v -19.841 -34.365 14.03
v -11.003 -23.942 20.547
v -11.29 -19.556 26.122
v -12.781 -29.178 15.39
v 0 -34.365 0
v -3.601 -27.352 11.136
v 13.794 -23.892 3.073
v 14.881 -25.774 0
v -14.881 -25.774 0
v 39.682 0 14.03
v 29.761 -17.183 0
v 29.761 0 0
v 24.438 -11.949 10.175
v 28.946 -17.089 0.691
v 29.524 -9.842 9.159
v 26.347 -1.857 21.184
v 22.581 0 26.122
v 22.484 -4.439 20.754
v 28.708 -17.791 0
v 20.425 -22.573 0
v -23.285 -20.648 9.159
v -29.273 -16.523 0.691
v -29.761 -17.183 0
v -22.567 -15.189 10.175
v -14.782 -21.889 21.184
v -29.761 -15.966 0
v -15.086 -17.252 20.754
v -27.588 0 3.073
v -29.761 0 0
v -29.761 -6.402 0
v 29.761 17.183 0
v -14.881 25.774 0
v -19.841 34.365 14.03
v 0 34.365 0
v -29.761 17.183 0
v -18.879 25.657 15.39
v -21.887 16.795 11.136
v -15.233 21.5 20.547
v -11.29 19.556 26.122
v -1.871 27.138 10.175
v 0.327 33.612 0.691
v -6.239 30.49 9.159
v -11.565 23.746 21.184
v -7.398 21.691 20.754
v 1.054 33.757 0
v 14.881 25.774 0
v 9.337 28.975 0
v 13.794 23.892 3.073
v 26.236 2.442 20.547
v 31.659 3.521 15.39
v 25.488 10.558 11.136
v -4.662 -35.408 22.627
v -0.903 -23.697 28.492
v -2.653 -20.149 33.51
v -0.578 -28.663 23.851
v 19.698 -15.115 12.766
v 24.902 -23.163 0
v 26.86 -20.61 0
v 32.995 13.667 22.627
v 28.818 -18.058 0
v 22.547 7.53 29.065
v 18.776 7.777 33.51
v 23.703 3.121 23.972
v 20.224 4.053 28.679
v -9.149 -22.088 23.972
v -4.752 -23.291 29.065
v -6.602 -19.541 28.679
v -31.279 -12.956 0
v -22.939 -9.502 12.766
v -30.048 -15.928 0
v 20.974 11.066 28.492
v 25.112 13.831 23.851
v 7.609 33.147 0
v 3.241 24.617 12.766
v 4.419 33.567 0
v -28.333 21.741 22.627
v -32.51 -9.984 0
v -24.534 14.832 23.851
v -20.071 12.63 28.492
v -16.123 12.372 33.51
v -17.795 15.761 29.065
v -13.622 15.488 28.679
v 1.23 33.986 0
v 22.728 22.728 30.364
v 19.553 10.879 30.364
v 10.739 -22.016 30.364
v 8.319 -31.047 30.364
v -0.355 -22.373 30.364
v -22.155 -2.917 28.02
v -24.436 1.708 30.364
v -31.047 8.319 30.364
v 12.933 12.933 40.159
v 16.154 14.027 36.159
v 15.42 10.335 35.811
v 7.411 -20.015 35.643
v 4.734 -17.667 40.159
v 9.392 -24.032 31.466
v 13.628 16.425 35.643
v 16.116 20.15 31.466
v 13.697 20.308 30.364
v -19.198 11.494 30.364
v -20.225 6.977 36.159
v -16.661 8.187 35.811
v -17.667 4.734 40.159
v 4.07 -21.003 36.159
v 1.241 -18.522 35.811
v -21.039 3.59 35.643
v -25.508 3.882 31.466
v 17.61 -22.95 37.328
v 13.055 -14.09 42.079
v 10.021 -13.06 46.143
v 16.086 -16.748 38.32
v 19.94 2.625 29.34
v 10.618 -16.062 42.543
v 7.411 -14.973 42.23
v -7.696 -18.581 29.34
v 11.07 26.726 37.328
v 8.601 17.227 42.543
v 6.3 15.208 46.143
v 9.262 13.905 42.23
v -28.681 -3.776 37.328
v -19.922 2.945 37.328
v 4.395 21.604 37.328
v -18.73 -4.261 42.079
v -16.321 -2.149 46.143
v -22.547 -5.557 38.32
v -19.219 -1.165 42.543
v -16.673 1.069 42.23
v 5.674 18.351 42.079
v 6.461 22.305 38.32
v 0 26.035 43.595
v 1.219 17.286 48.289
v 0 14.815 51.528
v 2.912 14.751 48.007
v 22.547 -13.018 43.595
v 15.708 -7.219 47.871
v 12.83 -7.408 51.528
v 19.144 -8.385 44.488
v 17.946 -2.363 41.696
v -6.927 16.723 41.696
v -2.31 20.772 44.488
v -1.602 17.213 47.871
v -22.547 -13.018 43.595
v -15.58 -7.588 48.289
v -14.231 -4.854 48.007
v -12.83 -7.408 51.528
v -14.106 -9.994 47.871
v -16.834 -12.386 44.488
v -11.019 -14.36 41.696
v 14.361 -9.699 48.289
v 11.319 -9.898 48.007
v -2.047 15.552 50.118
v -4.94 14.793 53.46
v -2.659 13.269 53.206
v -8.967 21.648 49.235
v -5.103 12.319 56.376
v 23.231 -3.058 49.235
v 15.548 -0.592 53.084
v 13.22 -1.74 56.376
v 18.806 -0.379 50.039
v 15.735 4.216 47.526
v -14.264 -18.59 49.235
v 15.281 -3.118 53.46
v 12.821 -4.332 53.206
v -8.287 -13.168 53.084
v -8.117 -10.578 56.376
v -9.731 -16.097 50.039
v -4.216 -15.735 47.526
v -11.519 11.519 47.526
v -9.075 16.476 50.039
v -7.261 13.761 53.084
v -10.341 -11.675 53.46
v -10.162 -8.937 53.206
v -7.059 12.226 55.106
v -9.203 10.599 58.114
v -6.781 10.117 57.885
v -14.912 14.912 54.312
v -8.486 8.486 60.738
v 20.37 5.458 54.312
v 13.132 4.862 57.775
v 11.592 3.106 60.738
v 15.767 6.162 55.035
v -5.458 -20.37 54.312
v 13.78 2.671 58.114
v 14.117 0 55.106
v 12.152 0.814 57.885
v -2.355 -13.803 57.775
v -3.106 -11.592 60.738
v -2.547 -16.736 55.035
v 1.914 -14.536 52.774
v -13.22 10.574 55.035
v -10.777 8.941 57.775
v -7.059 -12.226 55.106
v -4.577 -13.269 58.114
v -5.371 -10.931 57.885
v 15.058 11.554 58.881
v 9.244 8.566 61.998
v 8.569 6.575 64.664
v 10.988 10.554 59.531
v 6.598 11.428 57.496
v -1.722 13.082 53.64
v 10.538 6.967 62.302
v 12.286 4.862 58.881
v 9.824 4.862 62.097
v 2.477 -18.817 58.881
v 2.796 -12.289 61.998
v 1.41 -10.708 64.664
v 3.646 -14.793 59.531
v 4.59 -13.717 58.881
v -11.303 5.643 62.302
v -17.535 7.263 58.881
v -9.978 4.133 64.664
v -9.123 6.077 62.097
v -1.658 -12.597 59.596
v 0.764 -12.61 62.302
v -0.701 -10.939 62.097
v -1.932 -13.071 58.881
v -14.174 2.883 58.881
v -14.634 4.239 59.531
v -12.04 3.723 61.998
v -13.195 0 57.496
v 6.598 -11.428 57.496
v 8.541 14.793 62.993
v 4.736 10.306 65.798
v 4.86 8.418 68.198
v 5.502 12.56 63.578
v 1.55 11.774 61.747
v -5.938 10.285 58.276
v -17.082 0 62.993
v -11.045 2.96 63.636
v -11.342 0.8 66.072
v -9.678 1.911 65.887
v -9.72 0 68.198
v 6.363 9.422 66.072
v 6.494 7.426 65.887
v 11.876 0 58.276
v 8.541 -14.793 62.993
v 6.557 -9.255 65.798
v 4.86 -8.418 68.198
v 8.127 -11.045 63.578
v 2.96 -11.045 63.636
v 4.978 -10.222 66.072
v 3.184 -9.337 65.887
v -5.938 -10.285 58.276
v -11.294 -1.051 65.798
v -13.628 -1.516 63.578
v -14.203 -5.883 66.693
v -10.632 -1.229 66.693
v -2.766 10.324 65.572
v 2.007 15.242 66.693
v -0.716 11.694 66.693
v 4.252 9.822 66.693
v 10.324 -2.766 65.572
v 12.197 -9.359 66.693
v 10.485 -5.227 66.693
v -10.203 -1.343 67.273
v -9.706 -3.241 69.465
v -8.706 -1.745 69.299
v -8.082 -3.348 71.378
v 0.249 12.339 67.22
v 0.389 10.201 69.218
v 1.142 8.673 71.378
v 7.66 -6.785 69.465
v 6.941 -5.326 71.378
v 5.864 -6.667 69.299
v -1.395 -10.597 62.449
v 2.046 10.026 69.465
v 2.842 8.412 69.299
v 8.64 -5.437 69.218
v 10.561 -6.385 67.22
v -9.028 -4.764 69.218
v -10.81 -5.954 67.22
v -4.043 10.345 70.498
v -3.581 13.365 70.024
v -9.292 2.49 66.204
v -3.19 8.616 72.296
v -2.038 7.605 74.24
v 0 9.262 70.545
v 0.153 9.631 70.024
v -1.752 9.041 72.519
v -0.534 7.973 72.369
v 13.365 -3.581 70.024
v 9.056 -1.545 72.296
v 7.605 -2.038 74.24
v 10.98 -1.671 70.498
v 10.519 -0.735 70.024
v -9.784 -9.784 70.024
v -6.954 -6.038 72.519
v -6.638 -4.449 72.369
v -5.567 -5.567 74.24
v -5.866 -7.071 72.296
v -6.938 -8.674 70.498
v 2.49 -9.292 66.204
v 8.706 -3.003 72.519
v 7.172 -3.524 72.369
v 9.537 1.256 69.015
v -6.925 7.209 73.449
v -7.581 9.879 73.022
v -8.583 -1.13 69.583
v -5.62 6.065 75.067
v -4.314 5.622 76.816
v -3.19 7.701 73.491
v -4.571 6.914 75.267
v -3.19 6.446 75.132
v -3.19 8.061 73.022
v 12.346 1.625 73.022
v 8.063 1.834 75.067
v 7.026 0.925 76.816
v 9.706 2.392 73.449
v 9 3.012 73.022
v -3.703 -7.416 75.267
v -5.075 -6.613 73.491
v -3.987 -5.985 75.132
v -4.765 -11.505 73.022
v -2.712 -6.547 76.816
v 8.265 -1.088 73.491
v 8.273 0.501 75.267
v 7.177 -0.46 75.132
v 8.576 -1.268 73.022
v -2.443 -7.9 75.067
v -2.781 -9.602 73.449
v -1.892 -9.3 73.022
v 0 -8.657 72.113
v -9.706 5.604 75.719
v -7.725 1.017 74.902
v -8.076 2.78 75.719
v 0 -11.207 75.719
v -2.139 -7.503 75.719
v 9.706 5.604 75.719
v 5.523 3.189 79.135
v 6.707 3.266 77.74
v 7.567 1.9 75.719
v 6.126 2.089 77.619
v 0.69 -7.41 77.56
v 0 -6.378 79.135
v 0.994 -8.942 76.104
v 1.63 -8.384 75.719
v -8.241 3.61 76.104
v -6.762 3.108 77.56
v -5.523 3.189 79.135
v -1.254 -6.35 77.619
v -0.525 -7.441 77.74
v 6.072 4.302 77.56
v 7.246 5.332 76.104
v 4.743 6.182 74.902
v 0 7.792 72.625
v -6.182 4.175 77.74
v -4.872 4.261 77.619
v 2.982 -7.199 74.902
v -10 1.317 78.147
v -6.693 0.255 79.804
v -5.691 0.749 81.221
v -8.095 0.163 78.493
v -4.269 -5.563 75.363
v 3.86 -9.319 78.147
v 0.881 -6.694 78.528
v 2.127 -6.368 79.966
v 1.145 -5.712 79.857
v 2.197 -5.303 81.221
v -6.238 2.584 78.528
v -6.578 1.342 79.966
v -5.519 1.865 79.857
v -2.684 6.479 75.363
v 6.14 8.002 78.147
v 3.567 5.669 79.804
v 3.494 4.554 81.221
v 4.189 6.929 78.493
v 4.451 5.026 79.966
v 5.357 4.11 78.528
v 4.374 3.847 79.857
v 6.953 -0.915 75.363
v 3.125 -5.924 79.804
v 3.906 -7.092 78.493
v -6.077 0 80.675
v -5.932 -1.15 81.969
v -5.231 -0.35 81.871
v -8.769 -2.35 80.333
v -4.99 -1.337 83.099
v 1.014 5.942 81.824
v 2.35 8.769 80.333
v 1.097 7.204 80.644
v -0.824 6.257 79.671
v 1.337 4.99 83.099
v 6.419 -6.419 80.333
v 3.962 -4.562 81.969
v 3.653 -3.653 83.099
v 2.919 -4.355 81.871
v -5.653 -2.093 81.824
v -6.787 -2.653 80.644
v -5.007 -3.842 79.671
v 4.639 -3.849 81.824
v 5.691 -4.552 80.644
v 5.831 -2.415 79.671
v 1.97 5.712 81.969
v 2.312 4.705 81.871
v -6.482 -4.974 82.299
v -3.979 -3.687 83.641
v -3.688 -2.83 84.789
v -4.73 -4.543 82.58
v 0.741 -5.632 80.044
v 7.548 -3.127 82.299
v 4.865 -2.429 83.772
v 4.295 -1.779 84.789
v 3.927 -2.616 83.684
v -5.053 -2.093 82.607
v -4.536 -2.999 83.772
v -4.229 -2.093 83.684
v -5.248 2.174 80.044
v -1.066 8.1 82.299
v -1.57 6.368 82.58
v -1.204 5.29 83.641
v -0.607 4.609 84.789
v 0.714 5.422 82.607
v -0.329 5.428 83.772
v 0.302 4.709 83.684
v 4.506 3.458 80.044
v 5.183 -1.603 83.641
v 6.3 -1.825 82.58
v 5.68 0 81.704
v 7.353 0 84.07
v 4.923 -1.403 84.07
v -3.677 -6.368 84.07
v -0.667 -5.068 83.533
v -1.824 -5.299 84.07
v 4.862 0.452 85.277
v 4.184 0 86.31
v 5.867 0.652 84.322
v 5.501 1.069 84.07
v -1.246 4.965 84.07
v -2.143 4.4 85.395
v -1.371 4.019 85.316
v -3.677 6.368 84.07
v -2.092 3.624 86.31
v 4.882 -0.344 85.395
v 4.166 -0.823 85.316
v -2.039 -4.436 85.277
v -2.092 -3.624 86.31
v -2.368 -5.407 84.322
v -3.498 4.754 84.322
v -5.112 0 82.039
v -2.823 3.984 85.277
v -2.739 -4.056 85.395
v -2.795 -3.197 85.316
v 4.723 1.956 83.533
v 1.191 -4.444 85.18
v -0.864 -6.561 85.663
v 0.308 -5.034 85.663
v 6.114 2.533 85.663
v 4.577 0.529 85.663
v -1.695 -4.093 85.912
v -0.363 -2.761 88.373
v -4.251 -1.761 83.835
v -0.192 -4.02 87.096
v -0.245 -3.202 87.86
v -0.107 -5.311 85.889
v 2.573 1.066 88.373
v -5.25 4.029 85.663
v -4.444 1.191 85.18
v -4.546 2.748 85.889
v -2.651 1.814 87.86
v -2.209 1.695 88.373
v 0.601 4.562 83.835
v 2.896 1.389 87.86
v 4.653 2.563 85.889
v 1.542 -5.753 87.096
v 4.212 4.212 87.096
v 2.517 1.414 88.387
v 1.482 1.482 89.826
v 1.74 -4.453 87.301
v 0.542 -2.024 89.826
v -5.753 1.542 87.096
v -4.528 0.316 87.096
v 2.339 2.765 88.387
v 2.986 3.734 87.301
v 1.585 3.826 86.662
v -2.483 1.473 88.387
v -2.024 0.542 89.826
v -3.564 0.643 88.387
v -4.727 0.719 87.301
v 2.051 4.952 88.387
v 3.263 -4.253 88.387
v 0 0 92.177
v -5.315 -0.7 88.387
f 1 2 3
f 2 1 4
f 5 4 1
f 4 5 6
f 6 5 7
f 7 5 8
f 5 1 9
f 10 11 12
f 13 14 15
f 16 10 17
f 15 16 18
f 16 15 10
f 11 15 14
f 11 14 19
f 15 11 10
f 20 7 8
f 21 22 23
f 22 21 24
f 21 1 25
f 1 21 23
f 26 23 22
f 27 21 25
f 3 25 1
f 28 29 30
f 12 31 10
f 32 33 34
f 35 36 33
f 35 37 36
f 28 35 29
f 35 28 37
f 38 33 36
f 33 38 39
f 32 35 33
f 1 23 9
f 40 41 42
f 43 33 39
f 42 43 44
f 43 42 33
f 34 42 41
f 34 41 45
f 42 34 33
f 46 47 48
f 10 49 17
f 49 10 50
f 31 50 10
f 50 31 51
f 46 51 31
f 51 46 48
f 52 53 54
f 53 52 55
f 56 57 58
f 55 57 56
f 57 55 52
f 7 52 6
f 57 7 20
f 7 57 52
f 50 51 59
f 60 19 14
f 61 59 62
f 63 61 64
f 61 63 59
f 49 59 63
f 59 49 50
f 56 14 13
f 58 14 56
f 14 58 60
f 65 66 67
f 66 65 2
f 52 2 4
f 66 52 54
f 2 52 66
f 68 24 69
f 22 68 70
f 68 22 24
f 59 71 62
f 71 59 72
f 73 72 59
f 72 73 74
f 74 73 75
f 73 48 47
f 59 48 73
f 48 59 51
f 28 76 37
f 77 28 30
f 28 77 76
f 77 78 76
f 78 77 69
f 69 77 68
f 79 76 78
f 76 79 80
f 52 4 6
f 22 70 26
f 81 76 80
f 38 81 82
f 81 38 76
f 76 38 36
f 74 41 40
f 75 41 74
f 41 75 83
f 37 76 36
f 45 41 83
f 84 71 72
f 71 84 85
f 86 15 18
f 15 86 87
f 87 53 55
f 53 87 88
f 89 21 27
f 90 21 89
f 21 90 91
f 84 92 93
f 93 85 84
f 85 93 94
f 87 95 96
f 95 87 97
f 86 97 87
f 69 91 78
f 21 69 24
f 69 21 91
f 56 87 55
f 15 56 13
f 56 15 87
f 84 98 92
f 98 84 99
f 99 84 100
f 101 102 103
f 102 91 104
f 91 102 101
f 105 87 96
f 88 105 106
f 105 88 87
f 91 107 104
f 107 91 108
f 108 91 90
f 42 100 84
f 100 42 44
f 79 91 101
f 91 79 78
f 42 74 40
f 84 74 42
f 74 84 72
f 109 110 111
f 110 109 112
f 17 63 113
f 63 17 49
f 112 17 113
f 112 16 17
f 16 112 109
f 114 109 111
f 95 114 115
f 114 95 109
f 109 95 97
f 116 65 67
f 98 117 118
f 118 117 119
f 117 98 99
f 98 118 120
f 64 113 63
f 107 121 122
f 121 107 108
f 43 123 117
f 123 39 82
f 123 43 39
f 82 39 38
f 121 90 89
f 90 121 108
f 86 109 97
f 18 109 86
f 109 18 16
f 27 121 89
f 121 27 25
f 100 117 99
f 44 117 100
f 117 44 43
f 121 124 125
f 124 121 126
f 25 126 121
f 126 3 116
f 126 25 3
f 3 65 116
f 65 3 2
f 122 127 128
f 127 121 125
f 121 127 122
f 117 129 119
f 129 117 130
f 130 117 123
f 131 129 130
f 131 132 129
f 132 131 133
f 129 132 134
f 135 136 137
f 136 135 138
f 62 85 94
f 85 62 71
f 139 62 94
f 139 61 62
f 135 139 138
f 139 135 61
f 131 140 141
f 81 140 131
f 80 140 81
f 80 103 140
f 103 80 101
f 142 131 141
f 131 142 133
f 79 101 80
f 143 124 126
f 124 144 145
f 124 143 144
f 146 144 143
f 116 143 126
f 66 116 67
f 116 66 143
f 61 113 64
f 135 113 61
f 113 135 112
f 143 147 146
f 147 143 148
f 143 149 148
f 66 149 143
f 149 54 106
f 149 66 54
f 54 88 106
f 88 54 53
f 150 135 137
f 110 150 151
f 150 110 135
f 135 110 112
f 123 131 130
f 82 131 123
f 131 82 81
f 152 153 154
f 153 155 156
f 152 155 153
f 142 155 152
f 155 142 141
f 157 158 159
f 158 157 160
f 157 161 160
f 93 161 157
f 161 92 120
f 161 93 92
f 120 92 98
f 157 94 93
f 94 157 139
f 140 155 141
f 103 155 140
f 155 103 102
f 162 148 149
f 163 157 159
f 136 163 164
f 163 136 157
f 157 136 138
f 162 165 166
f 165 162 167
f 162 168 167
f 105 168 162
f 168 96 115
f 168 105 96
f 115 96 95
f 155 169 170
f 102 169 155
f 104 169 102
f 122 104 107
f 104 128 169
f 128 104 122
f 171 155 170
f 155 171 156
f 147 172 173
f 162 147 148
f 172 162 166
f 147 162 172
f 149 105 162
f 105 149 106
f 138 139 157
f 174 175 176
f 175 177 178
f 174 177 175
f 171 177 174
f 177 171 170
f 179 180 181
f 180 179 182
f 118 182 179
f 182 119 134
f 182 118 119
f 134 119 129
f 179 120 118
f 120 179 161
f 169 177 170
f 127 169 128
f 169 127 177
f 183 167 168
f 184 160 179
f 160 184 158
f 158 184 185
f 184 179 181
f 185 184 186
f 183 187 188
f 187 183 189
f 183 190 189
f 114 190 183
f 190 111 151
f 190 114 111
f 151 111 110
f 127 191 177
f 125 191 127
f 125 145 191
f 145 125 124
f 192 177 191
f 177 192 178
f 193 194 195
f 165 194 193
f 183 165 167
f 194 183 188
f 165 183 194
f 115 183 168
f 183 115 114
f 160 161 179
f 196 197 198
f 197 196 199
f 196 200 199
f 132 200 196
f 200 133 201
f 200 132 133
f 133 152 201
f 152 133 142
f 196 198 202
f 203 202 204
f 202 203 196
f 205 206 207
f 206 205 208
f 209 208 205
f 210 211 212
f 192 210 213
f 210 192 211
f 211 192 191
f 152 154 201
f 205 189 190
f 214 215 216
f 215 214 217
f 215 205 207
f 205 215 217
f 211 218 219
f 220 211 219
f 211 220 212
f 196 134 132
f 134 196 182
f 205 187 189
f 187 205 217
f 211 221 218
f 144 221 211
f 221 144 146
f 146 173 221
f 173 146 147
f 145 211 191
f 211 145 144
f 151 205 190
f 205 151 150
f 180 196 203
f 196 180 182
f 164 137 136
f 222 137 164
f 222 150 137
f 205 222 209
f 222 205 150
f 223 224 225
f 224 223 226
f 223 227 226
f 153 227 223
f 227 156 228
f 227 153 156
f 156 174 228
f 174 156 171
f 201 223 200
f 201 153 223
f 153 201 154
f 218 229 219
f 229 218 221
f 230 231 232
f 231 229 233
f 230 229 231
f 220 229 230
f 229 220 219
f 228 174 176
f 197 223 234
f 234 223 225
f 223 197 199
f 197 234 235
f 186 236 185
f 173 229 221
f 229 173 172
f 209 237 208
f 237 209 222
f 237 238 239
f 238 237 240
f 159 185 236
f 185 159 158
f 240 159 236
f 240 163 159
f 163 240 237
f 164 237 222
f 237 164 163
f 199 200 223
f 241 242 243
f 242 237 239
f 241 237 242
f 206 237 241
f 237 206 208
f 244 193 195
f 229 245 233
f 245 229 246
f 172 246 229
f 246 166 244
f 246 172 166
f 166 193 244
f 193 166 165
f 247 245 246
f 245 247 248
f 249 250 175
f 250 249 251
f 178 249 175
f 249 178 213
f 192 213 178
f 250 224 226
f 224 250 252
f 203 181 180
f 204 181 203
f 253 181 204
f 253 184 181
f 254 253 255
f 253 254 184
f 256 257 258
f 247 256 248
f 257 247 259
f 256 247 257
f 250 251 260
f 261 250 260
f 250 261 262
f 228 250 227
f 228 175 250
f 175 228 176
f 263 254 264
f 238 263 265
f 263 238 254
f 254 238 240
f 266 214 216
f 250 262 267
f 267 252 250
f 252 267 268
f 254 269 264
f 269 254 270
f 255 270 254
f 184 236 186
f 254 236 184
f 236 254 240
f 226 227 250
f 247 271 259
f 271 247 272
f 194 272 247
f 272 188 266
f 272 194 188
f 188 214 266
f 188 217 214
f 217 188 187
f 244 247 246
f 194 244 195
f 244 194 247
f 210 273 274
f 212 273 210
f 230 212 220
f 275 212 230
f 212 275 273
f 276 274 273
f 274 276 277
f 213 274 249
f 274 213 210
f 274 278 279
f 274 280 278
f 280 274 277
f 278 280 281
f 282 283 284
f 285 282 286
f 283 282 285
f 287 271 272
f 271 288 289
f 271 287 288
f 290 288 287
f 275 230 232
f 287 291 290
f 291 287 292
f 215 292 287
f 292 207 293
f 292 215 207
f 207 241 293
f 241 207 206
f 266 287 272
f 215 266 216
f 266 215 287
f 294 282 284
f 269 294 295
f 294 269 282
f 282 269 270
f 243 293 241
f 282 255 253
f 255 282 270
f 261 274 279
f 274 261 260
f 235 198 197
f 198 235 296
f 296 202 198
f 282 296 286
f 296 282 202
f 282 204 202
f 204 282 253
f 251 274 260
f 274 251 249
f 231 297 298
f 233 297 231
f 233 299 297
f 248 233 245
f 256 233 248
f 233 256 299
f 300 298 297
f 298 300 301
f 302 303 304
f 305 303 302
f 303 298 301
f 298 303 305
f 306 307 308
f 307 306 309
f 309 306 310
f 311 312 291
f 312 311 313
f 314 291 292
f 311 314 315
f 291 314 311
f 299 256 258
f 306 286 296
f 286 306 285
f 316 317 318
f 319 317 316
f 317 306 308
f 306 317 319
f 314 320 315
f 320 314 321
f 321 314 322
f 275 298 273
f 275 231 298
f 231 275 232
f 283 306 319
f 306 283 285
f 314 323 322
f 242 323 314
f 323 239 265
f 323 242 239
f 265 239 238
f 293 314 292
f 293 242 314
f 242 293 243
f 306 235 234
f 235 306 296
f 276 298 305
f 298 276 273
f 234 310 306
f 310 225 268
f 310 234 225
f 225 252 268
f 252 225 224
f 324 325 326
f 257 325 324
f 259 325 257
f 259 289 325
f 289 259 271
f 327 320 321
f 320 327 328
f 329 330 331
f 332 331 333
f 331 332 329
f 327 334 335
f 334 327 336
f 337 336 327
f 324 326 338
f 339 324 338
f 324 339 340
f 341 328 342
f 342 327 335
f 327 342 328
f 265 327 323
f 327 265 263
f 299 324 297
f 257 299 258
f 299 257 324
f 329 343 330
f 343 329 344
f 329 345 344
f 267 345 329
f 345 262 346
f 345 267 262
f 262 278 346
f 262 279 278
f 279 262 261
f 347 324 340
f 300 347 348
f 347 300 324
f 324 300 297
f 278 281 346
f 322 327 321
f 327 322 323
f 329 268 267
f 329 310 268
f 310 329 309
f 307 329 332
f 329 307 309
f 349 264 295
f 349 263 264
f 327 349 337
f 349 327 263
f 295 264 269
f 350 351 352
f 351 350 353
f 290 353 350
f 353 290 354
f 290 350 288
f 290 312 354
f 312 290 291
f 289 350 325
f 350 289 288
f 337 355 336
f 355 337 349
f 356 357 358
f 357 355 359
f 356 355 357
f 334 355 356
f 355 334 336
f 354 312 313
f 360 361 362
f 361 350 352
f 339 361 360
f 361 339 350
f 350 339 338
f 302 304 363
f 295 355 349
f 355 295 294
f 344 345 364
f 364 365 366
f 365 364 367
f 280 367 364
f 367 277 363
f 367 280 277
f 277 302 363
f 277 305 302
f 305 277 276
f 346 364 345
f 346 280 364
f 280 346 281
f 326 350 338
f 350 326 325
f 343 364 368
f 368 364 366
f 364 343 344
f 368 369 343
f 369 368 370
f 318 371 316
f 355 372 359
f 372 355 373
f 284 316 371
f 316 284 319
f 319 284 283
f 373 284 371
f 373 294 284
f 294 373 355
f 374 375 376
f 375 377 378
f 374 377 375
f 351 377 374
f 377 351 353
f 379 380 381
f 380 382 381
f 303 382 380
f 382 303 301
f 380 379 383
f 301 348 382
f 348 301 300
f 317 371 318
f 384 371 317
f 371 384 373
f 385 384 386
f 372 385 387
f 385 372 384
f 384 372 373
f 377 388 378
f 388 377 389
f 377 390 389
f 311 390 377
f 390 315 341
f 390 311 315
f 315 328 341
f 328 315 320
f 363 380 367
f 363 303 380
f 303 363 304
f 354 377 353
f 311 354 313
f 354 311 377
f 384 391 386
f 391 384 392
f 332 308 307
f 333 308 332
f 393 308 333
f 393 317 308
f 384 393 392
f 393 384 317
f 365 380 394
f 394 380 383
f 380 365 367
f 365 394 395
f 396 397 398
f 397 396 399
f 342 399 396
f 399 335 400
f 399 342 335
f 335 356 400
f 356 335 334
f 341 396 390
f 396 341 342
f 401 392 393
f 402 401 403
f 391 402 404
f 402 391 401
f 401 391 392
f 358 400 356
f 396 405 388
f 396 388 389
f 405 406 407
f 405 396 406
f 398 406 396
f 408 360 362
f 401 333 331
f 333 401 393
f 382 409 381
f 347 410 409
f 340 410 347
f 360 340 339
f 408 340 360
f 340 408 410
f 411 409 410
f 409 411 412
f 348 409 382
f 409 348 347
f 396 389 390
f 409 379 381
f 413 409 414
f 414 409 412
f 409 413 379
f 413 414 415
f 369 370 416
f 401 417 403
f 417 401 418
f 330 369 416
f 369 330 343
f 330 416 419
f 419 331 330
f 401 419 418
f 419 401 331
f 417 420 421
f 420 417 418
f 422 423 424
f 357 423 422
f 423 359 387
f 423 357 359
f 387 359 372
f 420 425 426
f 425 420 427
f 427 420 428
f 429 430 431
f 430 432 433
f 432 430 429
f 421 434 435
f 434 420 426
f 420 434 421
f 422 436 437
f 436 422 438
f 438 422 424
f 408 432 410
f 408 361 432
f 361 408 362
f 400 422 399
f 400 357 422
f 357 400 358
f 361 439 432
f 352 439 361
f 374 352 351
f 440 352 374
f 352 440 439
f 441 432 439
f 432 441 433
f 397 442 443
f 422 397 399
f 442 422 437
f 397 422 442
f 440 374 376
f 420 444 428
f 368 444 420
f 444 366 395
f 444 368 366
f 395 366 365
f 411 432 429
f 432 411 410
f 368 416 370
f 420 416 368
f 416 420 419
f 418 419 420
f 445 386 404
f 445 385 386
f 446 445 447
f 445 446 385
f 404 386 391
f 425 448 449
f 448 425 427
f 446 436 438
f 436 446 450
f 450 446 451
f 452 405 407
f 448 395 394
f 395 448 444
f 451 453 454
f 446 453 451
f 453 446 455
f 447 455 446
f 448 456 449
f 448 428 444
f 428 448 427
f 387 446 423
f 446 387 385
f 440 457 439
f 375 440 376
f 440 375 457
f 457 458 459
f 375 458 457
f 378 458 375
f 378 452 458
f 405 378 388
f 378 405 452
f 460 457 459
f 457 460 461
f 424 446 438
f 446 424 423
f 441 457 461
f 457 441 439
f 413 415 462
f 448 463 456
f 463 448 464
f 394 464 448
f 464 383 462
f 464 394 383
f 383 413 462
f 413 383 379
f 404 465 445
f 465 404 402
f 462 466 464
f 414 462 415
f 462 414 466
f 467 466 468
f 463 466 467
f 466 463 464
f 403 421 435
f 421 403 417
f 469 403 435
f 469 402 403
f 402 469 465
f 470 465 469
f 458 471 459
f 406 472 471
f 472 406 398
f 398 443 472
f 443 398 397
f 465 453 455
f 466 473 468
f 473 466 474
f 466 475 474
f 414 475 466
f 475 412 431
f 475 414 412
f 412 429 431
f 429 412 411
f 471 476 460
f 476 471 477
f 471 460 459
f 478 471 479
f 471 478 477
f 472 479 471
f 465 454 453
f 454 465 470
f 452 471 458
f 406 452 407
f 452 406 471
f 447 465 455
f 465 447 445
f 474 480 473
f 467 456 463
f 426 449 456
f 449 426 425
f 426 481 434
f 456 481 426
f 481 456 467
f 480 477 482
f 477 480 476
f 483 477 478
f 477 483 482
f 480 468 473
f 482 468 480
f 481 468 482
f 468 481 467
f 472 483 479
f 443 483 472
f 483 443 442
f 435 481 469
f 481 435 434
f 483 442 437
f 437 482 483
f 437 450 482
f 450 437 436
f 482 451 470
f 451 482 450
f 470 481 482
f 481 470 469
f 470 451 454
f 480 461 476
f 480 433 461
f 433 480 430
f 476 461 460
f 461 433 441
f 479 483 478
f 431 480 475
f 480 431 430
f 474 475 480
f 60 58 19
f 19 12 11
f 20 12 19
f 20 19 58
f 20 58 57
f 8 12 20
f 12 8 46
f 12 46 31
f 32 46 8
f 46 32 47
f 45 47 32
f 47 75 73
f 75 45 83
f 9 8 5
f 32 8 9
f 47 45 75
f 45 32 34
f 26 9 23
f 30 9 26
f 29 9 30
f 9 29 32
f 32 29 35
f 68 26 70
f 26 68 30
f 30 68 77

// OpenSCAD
intersection() {
	union() {
		translate(v = [0, 0, 0.0000000000]) {
			scale(v = 0.6000000000) {
				rotate(a = [0, 0, 0.0000000000]) {
					rotate(a = [45, 35.2643896828, 0]) {
						cube(center = true, size = 81.0000000000);
					}
				}
			}
		}
		translate(v = [0, 0, 10.0000000000]) {
			scale(v = 0.5400000000) {
				rotate(a = [0, 0, 22.5000000000]) {
					rotate(a = [45, 35.2643896828, 0]) {
						cube(center = true, size = 81.0000000000);
					}
				}
			}
		}
		translate(v = [0, 0, 19.0000000000]) {
			scale(v = 0.4860000000) {
				rotate(a = [0, 0, 45.0000000000]) {
					rotate(a = [45, 35.2643896828, 0]) {
						cube(center = true, size = 81.0000000000);
					}
				}
			}
		}
		translate(v = [0, 0, 27.1000000000]) {
			scale(v = 0.4374000000) {
				rotate(a = [0, 0, 67.5000000000]) {
					rotate(a = [45, 35.2643896828, 0]) {
						cube(center = true, size = 81.0000000000);
					}
				}
			}
		}
		translate(v = [0, 0, 34.3900000000]) {
			scale(v = 0.3936600000) {
				rotate(a = [0, 0, 90.0000000000]) {
					rotate(a = [45, 35.2643896828, 0]) {
						cube(center = true, size = 81.0000000000);
					}
				}
			}
		}
		translate(v = [0, 0, 40.9510000000]) {
			scale(v = 0.3542940000) {
				rotate(a = [0, 0, 112.5000000000]) {
					rotate(a = [45, 35.2643896828, 0]) {
						cube(center = true, size = 81.0000000000);
					}
				}
			}
		}
		translate(v = [0, 0, 46.8559000000]) {
			scale(v = 0.3188646000) {
				rotate(a = [0, 0, 135.0000000000]) {
					rotate(a = [45, 35.2643896828, 0]) {
						cube(center = true, size = 81.0000000000);
					}
				}
			}
		}
		translate(v = [0, 0, 52.1703100000]) {
			scale(v = 0.2869781400) {
				rotate(a = [0, 0, 157.5000000000]) {
					rotate(a = [45, 35.2643896828, 0]) {
						cube(center = true, size = 81.0000000000);
					}
				}
			}
		}
		translate(v = [0, 0, 56.9532790000]) {
			scale(v = 0.2582803260) {
				rotate(a = [0, 0, 180.0000000000]) {
					rotate(a = [45, 35.2643896828, 0]) {
						cube(center = true, size = 81.0000000000);
					}
				}
			}
		}
		translate(v = [0, 0, 61.2579511000]) {
			scale(v = 0.2324522934) {
				rotate(a = [0, 0, 202.5000000000]) {
					rotate(a = [45, 35.2643896828, 0]) {
						cube(center = true, size = 81.0000000000);
					}
				}
			}
		}
		translate(v = [0, 0, 65.1321559900]) {
			scale(v = 0.2092070641) {
				rotate(a = [0, 0, 225.0000000000]) {
					rotate(a = [45, 35.2643896828, 0]) {
						cube(center = true, size = 81.0000000000);
					}
				}
			}
		}
		translate(v = [0, 0, 68.6189403910]) {
			scale(v = 0.1882863577) {
				rotate(a = [0, 0, 247.5000000000]) {
					rotate(a = [45, 35.2643896828, 0]) {
						cube(center = true, size = 81.0000000000);
					}
				}
			}
		}
		translate(v = [0, 0, 71.7570463519]) {
			scale(v = 0.1694577219) {
				rotate(a = [0, 0, 270.0000000000]) {
					rotate(a = [45, 35.2643896828, 0]) {
						cube(center = true, size = 81.0000000000);
					}
				}
			}
		}
		translate(v = [0, 0, 74.5813417167]) {
			scale(v = 0.1525119497) {
				rotate(a = [0, 0, 292.5000000000]) {
					rotate(a = [45, 35.2643896828, 0]) {
						cube(center = true, size = 81.0000000000);
					}
				}
			}
		}
		translate(v = [0, 0, 77.1232075450]) {
			scale(v = 0.1372607547) {
				rotate(a = [0, 0, 315.0000000000]) {
					rotate(a = [45, 35.2643896828, 0]) {
						cube(center = true, size = 81.0000000000);
					}
				}
			}
		}
		translate(v = [0, 0, 79.4108867905]) {
			scale(v = 0.1235346793) {
				rotate(a = [0, 0, 337.5000000000]) {
					rotate(a = [45, 35.2643896828, 0]) {
						cube(center = true, size = 81.0000000000);
					}
				}
			}
		}
		translate(v = [0, 0, 81.4697981115]) {
			scale(v = 0.1111812113) {
				rotate(a = [0, 0, 360.0000000000]) {
					rotate(a = [45, 35.2643896828, 0]) {
						cube(center = true, size = 81.0000000000);
					}
				}
			}
		}
		translate(v = [0, 0, 83.3228183003]) {
			scale(v = 0.1000630902) {
				rotate(a = [0, 0, 382.5000000000]) {
					rotate(a = [45, 35.2643896828, 0]) {
						cube(center = true, size = 81.0000000000);
					}
				}
			}
		}
		translate(v = [0, 0, 84.9905364703]) {
			scale(v = 0.0900567812) {
				rotate(a = [0, 0, 405.0000000000]) {
					rotate(a = [45, 35.2643896828, 0]) {
						cube(center = true, size = 81.0000000000);
					}
				}
			}
		}
		translate(v = [0, 0, 86.4914828233]) {
			scale(v = 0.0810511031) {
				rotate(a = [0, 0, 427.5000000000]) {
					rotate(a = [45, 35.2643896828, 0]) {
						cube(center = true, size = 81.0000000000);
					}
				}
			}
		}
	}
	translate(v = [0, 0, 810.0000000000]) {
		cube(center = true, size = 1620.0000000000);
	}
}
